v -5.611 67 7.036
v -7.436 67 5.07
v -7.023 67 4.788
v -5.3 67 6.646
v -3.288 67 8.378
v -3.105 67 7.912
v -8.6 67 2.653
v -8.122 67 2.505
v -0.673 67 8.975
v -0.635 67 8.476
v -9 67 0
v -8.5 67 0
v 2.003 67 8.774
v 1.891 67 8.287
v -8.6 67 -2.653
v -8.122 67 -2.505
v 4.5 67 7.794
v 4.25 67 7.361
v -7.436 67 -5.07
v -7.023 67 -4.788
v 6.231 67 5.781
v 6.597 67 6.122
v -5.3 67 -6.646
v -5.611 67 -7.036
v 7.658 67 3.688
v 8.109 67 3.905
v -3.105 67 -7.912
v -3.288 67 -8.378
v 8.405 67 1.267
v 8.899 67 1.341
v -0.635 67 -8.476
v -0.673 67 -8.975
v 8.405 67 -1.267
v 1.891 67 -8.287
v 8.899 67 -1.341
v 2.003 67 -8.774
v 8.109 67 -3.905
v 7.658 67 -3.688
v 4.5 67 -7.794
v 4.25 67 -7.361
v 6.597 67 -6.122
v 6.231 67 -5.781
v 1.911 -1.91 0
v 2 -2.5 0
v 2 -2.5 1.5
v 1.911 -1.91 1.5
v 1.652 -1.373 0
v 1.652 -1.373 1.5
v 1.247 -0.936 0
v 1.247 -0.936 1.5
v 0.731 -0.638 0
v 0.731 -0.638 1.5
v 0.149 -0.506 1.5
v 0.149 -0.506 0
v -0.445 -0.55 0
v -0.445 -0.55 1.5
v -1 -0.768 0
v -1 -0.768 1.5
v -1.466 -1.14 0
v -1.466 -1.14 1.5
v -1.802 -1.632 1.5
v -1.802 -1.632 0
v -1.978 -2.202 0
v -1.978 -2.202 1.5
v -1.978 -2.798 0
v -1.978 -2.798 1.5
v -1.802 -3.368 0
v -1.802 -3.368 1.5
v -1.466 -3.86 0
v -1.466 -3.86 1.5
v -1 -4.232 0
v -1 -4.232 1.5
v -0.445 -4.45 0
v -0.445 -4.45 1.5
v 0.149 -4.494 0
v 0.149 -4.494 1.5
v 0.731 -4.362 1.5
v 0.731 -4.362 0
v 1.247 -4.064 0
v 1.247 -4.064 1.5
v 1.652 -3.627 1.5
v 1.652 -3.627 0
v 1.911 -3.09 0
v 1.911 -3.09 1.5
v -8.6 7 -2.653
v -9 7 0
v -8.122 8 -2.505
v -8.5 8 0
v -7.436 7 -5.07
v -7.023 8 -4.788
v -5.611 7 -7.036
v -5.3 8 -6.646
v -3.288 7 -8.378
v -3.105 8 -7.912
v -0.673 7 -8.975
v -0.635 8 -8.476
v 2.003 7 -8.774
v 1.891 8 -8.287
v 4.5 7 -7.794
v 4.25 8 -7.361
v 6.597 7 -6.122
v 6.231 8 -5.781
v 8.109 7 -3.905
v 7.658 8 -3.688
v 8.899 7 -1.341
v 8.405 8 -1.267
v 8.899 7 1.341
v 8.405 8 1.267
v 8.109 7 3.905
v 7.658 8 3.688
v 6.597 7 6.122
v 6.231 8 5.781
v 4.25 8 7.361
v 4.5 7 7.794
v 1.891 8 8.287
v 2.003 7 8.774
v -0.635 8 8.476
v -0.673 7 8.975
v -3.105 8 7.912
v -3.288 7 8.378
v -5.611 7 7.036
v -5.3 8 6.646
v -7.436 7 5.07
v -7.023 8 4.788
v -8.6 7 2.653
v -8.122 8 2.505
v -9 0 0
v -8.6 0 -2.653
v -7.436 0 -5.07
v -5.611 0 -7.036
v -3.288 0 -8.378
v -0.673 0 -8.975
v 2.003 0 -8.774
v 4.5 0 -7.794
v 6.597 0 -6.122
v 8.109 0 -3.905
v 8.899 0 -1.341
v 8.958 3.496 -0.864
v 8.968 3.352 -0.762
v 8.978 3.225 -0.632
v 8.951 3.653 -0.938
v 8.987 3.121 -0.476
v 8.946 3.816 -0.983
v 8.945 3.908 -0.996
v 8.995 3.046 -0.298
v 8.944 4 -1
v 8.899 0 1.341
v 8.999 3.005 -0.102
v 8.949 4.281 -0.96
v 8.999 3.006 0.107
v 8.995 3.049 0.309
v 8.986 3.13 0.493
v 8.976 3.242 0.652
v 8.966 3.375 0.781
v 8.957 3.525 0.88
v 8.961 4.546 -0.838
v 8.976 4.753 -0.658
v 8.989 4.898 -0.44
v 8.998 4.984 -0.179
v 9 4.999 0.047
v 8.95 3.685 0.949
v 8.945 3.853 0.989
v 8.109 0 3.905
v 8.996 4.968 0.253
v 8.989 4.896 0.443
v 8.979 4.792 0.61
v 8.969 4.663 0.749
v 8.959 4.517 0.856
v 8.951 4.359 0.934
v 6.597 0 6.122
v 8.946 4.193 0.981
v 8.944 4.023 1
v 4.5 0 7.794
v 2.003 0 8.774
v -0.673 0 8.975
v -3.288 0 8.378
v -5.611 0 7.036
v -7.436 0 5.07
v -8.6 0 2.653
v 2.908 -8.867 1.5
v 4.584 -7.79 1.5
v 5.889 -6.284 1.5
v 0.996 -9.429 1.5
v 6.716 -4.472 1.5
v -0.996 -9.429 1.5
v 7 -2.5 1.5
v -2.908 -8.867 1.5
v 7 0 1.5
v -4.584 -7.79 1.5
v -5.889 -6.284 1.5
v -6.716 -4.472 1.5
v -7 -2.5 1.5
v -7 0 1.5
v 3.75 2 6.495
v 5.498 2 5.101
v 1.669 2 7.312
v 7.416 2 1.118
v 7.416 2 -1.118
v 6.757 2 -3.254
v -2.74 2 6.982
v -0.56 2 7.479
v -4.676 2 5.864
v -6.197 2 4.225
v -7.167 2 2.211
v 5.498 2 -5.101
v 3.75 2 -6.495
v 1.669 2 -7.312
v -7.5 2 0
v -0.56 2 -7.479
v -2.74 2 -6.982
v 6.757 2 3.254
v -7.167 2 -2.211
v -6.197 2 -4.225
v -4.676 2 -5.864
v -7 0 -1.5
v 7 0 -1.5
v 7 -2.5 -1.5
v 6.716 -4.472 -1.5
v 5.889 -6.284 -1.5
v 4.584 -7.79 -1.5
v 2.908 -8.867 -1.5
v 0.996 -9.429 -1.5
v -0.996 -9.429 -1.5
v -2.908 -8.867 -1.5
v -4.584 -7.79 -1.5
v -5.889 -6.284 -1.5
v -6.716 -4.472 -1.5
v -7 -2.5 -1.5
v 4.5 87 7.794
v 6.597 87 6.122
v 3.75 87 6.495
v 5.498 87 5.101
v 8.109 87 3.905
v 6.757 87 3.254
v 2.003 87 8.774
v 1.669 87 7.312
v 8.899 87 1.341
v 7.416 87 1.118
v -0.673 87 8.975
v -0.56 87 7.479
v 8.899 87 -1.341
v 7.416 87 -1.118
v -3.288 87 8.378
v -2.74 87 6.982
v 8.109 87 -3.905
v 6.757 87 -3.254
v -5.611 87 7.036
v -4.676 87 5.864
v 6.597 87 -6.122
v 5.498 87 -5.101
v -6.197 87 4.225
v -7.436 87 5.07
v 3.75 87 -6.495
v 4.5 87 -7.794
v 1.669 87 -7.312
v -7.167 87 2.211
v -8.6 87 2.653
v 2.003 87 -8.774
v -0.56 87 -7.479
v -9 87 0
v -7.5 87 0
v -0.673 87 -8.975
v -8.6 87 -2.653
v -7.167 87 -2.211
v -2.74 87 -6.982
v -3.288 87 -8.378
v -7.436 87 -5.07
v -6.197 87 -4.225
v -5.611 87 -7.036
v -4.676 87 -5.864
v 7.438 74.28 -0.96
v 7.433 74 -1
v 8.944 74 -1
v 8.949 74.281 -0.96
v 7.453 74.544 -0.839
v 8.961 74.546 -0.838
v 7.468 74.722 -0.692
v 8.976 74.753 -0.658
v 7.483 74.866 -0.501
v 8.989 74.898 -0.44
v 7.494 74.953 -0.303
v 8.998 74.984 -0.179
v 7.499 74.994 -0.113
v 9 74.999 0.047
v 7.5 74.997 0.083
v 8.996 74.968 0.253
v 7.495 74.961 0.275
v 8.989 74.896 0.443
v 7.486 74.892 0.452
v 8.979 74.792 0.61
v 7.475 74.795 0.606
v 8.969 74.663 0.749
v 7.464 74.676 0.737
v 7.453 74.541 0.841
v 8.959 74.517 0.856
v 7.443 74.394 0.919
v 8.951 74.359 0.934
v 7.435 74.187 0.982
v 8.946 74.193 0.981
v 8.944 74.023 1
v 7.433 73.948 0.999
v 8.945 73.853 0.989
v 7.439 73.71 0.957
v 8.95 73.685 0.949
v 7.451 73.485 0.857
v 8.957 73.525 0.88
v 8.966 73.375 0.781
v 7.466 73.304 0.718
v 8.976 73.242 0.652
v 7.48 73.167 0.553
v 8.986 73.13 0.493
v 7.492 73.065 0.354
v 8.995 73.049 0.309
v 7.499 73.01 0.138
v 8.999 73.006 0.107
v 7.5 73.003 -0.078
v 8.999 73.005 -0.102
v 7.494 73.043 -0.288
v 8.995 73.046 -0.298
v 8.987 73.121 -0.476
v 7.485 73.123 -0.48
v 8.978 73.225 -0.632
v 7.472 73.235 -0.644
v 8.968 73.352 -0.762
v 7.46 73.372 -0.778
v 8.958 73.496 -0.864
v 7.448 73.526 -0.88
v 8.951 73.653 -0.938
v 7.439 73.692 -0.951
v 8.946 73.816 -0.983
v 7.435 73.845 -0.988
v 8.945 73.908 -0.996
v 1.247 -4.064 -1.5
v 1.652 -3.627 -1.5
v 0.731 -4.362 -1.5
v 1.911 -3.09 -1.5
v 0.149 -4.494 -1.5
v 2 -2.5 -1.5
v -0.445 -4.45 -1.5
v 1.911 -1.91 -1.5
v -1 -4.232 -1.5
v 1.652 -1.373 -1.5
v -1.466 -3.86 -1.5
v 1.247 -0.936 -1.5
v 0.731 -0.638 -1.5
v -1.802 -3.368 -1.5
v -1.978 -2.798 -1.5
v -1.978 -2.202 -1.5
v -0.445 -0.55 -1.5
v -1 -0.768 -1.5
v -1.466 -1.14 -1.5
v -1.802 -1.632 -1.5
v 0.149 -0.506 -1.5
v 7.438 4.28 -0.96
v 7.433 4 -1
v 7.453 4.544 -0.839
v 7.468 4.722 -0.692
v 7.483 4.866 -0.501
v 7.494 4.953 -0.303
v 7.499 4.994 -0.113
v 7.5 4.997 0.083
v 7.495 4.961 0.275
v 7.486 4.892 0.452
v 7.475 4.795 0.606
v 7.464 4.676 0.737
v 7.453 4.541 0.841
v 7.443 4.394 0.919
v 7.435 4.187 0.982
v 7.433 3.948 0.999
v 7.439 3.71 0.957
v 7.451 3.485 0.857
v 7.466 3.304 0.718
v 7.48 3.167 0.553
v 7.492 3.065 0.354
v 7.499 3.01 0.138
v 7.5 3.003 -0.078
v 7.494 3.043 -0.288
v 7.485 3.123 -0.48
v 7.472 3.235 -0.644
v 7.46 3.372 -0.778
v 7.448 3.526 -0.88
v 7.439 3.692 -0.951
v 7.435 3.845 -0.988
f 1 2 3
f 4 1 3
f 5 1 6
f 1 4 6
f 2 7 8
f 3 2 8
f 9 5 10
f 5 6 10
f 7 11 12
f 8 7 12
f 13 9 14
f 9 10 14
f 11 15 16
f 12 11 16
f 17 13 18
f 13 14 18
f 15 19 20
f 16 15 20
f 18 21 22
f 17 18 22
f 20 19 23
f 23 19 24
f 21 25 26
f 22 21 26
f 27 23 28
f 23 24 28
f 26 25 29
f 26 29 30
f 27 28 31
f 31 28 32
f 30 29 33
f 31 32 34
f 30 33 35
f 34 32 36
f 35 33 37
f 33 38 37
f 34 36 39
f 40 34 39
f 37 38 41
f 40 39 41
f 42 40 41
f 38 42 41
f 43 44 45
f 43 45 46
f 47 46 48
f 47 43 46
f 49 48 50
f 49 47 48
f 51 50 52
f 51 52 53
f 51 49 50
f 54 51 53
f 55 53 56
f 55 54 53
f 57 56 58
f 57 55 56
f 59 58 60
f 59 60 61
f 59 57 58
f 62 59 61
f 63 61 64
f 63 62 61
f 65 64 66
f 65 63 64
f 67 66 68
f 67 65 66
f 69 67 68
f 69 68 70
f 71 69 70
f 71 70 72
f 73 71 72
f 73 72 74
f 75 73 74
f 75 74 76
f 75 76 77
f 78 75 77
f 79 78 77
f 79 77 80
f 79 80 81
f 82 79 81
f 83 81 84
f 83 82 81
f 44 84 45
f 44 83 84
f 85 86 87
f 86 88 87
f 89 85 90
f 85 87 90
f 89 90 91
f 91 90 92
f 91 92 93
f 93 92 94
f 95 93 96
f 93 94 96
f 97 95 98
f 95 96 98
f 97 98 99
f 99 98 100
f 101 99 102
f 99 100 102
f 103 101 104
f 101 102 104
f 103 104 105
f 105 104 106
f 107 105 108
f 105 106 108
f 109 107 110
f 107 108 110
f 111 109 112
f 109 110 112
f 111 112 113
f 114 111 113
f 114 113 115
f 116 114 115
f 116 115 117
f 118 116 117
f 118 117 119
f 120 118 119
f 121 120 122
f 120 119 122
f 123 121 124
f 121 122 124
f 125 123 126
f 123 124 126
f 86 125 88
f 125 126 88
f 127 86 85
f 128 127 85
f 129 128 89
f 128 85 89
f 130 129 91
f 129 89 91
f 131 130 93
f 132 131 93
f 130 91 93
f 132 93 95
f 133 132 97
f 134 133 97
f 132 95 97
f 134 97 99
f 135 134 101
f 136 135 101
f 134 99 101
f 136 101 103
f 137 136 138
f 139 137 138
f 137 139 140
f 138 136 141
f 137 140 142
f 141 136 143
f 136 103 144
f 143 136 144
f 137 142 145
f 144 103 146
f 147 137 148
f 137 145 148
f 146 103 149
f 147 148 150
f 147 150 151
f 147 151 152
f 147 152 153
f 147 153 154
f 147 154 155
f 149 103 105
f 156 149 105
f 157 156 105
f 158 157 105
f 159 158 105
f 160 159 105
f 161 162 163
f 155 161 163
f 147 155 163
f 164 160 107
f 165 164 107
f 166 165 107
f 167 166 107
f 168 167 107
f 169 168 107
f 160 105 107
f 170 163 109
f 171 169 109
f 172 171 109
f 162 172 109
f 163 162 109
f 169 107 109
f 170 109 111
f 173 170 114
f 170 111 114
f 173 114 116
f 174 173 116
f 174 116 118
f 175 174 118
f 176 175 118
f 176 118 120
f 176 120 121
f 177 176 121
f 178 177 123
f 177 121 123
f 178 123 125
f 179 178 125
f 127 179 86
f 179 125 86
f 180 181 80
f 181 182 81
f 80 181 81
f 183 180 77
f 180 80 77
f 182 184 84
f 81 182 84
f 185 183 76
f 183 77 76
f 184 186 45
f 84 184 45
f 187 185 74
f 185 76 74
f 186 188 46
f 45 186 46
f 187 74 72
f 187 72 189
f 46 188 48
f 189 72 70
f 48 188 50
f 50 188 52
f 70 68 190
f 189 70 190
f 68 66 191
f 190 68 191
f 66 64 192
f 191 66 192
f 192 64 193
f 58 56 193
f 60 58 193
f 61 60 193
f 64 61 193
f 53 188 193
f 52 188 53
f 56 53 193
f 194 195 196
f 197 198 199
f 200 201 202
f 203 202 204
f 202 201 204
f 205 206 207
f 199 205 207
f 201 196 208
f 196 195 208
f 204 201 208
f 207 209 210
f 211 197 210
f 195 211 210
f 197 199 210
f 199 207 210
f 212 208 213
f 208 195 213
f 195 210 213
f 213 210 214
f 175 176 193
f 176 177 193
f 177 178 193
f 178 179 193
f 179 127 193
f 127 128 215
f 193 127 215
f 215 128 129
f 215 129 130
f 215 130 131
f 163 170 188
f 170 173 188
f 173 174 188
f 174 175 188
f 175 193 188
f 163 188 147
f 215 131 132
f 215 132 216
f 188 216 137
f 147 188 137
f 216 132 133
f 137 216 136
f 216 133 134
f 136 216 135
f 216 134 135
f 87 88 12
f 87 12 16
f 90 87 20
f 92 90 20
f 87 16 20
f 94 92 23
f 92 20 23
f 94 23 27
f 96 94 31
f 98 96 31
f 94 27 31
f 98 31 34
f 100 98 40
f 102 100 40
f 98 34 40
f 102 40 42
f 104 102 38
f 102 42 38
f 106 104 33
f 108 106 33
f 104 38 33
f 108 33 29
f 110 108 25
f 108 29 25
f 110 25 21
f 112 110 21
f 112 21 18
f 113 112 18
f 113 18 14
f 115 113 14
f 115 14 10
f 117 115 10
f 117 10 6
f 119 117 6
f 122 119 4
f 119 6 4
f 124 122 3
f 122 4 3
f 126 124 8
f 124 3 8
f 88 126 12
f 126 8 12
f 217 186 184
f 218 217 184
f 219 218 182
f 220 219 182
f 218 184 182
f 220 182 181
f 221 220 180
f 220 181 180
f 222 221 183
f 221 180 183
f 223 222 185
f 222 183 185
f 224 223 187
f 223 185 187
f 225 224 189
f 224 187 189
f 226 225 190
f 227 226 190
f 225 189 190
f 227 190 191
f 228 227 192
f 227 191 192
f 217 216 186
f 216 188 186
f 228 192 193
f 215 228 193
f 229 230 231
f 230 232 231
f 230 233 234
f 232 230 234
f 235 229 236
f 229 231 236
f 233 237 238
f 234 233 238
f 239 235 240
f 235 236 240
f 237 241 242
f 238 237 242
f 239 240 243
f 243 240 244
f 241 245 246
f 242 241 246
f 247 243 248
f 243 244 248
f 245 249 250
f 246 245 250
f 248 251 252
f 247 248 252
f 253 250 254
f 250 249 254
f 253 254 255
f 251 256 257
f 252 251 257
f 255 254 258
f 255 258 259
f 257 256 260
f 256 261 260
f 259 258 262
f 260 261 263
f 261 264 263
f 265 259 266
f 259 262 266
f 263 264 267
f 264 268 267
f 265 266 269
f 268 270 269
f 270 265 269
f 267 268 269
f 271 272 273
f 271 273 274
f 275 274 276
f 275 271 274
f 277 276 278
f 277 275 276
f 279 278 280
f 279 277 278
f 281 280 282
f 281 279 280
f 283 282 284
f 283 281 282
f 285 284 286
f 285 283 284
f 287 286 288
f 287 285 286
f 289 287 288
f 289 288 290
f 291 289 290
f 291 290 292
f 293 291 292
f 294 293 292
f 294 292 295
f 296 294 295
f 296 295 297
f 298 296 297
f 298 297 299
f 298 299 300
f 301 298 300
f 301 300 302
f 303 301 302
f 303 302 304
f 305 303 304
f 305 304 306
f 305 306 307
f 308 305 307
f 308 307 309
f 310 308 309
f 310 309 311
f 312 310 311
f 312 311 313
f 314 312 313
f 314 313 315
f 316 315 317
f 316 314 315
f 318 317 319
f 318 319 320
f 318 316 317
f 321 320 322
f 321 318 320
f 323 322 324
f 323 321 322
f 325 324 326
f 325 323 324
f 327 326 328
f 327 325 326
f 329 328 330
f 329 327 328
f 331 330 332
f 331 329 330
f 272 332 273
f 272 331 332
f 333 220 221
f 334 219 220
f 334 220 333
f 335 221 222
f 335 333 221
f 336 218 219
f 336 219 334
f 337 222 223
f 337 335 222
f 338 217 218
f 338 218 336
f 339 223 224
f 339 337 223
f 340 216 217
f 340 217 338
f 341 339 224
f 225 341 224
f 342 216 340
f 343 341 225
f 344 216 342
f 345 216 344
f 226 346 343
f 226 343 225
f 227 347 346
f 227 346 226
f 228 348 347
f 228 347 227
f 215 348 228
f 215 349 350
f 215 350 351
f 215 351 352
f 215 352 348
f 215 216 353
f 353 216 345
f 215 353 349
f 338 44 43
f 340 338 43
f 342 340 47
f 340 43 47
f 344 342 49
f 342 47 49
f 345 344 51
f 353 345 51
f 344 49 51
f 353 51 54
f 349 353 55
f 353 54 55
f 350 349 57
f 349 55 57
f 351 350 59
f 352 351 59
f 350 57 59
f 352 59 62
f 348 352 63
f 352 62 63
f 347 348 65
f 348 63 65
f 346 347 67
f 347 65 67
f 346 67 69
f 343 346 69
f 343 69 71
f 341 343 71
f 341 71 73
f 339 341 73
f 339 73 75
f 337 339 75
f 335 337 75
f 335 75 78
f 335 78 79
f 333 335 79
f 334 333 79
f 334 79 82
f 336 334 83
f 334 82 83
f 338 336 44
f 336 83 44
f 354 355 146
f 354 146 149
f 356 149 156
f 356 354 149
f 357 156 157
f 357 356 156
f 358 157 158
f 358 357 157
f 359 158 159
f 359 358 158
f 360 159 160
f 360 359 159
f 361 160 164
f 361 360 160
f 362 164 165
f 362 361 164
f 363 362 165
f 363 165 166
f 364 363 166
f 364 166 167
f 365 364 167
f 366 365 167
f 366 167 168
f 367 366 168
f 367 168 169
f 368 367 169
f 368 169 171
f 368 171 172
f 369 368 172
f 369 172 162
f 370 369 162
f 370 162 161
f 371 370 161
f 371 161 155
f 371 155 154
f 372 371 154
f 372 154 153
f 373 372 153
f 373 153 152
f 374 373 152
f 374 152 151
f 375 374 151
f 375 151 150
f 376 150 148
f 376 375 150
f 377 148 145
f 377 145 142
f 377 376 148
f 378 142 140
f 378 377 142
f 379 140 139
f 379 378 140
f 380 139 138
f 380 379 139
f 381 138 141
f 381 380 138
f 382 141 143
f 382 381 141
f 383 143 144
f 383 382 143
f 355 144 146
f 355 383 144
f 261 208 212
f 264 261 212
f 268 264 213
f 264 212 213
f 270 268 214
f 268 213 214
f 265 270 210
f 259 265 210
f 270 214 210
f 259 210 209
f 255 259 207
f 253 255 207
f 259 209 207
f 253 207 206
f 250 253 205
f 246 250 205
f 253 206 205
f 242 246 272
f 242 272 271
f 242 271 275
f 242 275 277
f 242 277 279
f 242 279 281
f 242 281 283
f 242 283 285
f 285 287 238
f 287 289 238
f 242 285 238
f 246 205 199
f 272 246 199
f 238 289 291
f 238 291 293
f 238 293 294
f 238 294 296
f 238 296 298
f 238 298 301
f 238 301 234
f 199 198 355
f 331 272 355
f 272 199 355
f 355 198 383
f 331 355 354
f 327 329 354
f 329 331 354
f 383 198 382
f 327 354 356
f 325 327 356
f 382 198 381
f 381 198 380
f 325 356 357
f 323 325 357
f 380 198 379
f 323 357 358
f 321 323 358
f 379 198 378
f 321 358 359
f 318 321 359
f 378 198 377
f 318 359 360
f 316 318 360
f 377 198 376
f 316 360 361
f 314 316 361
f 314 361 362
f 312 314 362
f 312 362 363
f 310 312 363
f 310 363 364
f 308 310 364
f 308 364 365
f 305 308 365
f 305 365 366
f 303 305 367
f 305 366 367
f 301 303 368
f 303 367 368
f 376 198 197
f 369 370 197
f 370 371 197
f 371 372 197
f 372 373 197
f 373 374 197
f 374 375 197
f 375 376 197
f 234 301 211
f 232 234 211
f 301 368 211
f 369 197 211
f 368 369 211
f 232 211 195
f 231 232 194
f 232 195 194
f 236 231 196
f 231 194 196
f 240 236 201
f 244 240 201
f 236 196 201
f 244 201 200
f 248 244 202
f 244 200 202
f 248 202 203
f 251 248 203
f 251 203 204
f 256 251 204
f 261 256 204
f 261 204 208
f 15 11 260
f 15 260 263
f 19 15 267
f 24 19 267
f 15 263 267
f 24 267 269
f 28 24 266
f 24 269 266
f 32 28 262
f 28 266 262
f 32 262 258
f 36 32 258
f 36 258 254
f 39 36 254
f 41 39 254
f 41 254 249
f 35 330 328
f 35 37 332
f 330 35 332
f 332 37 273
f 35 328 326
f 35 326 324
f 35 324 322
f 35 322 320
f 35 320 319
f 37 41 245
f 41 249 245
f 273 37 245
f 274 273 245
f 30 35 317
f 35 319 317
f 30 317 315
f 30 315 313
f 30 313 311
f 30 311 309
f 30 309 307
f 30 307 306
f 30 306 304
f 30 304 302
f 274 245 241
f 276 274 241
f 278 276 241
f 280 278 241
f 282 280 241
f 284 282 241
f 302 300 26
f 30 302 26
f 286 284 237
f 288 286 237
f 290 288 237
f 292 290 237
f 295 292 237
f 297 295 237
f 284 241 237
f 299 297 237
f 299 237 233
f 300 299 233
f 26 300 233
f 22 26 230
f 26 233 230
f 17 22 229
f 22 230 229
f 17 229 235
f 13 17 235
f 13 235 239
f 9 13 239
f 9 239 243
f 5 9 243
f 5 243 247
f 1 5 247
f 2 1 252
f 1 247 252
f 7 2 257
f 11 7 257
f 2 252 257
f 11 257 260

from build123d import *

# Parameters (mm, degrees)
BOSS_EXTRUDE1_DEPTH      = 1.5
BOSS_EXTRUDE1_DEPTH_BACK = 1.5
SKETCH2_R                = 2
SKETCH3_R                = 1
CUT_EXTRUDE1_DEPTH       = 50


with BuildPart() as part:
    # Sketch1 → Revolve1 (revolve)
    with BuildSketch(Plane.XY):
        Polygon((0, 0), (-9, 0), (-9, 7), (-8.5, 8), (-8.5, 67), (-9, 67), (-9, 87), (-7.5, 87), (-7.5, 2), (0, 2), align=None)
    revolve(axis=Axis((0, 87, 0), (0, -1, 0)))

    # Sketch2 → Boss-Extrude1 (add, two sides: drawn at the far end of the back side and taken through both)
    with BuildSketch(Plane.XY.offset(-BOSS_EXTRUDE1_DEPTH_BACK)):
        with BuildLine():
            Line((-7, 0), (7, 0))
            Line((7, 0), (7, -2.5))
            ThreePointArc((7, -2.5), (0, -9.5), (-7, -2.5))
            Line((-7, -2.5), (-7, 0))
        make_face()
        with Locations((0, -2.5)):
            Circle(SKETCH2_R, mode=Mode.SUBTRACT)
    extrude(amount=BOSS_EXTRUDE1_DEPTH + BOSS_EXTRUDE1_DEPTH_BACK)

    # Sketch3 → Cut-Extrude1 (cut)
    with BuildSketch(Plane(origin=(0, 0, 0), x_dir=(0, 0, -1), z_dir=(1, 0, 0))):
        with Locations((0, 74)):
            Circle(SKETCH3_R)
        with Locations((0, 4)):
            Circle(SKETCH3_R)
    extrude(amount=CUT_EXTRUDE1_DEPTH, mode=Mode.SUBTRACT)


solid = part.part
